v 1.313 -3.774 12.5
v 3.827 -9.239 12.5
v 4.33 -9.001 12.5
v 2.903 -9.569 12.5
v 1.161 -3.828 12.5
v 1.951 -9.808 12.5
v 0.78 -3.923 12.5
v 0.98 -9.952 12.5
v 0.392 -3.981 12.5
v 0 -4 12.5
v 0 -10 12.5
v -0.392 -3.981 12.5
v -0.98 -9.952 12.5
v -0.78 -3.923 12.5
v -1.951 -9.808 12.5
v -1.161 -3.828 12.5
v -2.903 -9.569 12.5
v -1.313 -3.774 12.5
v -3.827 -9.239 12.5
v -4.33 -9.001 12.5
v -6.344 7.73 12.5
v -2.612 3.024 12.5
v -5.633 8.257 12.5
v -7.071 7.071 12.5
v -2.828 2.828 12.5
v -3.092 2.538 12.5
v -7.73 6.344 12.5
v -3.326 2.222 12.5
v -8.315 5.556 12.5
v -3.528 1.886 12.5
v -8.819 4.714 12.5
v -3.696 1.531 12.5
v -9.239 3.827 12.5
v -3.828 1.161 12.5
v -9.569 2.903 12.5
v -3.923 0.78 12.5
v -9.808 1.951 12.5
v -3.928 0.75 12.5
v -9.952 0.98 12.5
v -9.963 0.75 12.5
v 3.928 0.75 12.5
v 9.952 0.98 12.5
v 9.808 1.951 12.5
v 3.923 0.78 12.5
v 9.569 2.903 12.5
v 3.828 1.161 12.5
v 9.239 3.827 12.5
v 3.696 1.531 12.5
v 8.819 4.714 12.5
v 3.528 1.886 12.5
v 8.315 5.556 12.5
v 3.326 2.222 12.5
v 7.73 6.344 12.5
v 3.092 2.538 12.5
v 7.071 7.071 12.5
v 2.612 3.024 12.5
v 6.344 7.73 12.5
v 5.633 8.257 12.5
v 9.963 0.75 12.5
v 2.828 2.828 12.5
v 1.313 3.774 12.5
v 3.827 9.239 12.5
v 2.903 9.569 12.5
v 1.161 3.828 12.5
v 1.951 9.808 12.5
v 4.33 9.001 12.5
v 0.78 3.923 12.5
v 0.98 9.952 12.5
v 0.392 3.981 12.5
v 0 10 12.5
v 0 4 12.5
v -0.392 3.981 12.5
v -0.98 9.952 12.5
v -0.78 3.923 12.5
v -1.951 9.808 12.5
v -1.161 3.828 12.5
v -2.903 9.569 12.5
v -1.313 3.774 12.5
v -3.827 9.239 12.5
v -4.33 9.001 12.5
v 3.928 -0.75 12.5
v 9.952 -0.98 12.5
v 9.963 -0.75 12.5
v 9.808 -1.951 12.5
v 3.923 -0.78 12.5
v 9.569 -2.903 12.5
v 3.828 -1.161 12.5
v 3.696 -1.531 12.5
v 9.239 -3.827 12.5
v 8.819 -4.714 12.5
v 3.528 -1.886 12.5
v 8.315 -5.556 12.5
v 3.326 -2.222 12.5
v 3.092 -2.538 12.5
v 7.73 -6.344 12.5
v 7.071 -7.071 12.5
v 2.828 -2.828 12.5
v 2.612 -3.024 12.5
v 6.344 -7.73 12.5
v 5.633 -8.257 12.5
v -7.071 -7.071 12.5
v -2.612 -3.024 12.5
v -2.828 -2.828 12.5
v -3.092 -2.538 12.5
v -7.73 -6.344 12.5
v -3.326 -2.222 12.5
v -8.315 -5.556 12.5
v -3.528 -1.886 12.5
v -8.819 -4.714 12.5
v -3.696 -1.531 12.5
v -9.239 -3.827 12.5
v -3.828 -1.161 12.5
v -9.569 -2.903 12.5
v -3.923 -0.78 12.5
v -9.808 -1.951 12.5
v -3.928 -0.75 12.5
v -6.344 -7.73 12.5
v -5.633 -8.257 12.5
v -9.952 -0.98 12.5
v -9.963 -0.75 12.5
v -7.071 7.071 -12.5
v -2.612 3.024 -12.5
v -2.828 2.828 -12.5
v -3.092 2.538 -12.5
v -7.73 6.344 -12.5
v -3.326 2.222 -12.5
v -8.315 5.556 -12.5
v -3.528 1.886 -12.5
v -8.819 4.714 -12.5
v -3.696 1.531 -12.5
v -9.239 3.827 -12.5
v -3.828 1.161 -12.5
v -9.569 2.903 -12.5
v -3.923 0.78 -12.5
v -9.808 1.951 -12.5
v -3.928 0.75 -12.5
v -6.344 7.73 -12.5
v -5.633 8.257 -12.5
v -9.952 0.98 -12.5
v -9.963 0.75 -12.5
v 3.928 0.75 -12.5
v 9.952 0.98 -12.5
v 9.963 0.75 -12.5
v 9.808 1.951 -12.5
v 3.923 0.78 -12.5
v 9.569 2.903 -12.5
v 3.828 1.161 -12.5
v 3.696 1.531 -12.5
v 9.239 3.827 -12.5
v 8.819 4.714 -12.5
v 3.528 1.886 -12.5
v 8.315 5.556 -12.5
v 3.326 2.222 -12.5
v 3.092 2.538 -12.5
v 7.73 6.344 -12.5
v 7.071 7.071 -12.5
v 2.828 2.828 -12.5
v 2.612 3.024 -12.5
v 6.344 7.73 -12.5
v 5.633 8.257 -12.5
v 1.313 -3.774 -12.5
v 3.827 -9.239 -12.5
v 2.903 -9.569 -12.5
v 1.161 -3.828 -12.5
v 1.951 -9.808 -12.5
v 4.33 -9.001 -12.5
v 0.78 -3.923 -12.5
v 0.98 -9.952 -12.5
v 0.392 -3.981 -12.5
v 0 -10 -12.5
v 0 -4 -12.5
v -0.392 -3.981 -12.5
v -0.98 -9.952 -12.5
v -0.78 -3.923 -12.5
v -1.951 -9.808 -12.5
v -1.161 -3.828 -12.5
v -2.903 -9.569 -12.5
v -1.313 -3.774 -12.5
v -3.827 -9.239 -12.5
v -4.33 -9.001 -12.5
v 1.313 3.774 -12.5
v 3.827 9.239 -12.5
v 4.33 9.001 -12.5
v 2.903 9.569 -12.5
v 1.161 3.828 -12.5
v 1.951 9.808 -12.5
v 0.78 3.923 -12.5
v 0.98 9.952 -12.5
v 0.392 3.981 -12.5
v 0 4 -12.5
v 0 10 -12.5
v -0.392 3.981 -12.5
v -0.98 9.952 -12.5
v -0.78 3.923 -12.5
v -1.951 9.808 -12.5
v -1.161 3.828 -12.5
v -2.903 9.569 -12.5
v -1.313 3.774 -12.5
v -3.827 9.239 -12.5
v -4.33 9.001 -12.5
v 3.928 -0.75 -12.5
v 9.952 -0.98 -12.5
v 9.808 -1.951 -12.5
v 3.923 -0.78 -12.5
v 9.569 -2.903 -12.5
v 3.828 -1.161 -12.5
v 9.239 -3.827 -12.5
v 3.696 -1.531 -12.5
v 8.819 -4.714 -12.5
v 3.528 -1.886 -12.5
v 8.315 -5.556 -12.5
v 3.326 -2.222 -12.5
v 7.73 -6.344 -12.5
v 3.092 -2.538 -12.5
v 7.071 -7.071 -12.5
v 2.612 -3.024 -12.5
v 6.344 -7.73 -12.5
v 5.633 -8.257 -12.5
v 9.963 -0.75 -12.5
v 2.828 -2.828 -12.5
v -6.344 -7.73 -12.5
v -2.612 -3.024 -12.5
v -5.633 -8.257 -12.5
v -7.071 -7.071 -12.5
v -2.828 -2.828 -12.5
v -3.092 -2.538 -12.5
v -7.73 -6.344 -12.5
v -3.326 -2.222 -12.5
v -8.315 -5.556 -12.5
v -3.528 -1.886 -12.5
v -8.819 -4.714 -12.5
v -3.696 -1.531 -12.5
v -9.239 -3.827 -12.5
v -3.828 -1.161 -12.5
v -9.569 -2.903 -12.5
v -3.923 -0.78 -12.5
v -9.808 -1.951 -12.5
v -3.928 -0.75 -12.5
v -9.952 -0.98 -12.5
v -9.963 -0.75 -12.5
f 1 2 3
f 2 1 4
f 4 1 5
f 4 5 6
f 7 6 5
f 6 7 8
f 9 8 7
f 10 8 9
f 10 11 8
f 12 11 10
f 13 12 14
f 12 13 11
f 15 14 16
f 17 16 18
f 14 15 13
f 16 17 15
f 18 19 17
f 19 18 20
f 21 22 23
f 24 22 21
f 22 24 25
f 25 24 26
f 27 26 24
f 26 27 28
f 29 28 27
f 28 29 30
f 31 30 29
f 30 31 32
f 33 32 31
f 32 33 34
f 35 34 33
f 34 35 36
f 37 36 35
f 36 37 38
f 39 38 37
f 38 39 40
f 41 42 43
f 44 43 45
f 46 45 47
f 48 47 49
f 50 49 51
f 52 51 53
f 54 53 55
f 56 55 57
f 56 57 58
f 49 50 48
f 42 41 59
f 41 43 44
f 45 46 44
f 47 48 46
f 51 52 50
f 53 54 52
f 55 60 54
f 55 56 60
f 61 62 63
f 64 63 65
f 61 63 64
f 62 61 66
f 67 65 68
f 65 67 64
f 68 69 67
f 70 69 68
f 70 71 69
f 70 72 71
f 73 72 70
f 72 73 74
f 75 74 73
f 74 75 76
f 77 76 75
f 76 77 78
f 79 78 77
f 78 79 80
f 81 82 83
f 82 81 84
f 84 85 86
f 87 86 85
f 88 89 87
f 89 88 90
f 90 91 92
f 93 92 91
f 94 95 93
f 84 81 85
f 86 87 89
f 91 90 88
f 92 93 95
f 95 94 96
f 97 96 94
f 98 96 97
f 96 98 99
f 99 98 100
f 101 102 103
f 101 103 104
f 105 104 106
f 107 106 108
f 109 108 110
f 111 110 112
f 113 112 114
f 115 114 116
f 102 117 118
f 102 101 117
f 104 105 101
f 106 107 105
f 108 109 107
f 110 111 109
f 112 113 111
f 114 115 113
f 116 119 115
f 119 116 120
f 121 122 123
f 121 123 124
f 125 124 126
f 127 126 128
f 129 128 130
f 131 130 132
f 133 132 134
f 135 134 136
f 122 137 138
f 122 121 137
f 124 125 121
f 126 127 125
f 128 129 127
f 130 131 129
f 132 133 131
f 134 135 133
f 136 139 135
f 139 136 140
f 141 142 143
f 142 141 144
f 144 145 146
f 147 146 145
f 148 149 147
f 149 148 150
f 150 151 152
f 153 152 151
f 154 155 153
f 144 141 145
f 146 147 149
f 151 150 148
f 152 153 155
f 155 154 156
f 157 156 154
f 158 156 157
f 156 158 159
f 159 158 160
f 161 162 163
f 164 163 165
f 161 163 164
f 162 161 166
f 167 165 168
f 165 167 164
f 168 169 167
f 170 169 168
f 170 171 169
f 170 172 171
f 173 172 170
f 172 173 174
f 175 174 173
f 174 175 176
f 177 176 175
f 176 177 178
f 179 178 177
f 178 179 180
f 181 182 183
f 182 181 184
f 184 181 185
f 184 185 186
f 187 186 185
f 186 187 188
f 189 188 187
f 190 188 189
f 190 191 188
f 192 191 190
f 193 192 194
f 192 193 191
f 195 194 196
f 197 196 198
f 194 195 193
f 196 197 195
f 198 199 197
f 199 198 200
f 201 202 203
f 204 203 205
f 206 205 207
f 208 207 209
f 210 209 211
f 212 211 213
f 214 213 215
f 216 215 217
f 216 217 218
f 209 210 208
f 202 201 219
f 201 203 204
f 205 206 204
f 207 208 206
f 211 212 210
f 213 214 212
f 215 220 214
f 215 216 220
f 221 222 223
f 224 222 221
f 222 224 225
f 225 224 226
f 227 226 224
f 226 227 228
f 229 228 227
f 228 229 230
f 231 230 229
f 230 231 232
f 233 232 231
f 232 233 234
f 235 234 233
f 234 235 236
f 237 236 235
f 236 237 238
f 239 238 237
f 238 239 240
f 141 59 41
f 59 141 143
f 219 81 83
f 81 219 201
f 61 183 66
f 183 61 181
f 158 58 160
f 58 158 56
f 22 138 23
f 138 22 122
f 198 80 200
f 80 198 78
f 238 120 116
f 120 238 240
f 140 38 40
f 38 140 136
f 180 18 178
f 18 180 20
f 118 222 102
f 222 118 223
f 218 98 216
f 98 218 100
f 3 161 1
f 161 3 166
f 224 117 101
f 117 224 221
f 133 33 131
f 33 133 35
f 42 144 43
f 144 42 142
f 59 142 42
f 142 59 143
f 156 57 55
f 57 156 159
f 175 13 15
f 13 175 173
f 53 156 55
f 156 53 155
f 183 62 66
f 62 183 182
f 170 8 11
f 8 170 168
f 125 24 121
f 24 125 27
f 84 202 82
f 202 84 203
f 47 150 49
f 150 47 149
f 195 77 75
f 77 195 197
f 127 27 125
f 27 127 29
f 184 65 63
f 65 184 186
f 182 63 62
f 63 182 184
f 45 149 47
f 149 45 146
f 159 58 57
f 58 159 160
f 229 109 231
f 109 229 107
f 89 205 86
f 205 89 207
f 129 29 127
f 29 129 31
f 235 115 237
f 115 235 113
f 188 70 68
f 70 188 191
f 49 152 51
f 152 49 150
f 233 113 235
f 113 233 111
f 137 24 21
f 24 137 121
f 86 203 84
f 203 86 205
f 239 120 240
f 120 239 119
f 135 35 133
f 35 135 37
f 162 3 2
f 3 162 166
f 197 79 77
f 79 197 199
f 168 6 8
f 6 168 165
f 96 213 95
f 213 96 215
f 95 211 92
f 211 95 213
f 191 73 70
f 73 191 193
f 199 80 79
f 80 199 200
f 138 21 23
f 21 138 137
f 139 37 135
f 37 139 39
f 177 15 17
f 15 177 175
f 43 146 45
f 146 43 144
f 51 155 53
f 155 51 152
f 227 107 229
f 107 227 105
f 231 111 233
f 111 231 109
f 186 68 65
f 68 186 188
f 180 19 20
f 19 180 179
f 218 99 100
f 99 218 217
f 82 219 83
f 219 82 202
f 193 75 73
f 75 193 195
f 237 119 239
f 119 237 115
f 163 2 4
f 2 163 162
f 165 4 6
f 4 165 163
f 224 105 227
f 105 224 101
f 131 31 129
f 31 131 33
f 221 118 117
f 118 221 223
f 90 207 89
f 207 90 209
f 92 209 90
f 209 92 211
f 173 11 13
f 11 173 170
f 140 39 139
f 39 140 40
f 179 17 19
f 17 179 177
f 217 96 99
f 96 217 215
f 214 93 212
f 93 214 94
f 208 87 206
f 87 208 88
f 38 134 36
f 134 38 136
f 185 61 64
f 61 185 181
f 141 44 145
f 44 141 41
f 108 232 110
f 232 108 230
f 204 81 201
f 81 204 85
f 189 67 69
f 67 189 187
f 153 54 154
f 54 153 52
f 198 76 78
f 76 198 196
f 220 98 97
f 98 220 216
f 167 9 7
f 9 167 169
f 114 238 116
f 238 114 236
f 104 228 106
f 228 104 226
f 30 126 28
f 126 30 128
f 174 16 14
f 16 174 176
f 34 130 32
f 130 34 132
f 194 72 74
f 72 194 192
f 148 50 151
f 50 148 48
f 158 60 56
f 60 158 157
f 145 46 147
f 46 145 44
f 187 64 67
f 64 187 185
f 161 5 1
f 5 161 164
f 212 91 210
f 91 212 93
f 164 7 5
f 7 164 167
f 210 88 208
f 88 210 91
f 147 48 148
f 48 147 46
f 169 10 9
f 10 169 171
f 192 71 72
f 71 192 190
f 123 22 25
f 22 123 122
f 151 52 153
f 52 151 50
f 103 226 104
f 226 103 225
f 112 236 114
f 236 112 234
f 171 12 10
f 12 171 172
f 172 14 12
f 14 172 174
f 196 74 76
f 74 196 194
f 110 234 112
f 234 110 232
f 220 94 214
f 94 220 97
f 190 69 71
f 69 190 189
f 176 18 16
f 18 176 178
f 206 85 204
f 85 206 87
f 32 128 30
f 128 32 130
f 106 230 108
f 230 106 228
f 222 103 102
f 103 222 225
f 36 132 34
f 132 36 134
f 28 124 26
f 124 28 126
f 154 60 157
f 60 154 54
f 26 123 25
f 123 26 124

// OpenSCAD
$fn=64;

// Parameters
shaft_diameter_5mm = 5;
shaft_diameter_8mm = 8;
coupler_length = 25;
outer_diameter = 20;
flex_slot_width = 1.5;
flex_slot_depth = 8;
flex_slot_count = 6;

// Main Coupler Body
module coupler() {
    difference() {
        // Outer cylinder
        cylinder(h=coupler_length, d=outer_diameter, center=true);
        
        // Inner holes for shafts
        translate([0, 0, -coupler_length/2])
            cylinder(h=coupler_length, d=shaft_diameter_5mm, center=false);
        translate([0, 0, -coupler_length/2])
            cylinder(h=coupler_length, d=shaft_diameter_8mm, center=false);
        
        // Flex slots
        for (i = [0 : flex_slot_count-1]) {
            rotate([0, 0, i * 360 / flex_slot_count])
                translate([outer_diameter/2 - flex_slot_depth/2, 0, 0])
                    cube([flex_slot_depth, flex_slot_width, coupler_length], center=true);
        }
    }
}

// Render the coupler
coupler();
